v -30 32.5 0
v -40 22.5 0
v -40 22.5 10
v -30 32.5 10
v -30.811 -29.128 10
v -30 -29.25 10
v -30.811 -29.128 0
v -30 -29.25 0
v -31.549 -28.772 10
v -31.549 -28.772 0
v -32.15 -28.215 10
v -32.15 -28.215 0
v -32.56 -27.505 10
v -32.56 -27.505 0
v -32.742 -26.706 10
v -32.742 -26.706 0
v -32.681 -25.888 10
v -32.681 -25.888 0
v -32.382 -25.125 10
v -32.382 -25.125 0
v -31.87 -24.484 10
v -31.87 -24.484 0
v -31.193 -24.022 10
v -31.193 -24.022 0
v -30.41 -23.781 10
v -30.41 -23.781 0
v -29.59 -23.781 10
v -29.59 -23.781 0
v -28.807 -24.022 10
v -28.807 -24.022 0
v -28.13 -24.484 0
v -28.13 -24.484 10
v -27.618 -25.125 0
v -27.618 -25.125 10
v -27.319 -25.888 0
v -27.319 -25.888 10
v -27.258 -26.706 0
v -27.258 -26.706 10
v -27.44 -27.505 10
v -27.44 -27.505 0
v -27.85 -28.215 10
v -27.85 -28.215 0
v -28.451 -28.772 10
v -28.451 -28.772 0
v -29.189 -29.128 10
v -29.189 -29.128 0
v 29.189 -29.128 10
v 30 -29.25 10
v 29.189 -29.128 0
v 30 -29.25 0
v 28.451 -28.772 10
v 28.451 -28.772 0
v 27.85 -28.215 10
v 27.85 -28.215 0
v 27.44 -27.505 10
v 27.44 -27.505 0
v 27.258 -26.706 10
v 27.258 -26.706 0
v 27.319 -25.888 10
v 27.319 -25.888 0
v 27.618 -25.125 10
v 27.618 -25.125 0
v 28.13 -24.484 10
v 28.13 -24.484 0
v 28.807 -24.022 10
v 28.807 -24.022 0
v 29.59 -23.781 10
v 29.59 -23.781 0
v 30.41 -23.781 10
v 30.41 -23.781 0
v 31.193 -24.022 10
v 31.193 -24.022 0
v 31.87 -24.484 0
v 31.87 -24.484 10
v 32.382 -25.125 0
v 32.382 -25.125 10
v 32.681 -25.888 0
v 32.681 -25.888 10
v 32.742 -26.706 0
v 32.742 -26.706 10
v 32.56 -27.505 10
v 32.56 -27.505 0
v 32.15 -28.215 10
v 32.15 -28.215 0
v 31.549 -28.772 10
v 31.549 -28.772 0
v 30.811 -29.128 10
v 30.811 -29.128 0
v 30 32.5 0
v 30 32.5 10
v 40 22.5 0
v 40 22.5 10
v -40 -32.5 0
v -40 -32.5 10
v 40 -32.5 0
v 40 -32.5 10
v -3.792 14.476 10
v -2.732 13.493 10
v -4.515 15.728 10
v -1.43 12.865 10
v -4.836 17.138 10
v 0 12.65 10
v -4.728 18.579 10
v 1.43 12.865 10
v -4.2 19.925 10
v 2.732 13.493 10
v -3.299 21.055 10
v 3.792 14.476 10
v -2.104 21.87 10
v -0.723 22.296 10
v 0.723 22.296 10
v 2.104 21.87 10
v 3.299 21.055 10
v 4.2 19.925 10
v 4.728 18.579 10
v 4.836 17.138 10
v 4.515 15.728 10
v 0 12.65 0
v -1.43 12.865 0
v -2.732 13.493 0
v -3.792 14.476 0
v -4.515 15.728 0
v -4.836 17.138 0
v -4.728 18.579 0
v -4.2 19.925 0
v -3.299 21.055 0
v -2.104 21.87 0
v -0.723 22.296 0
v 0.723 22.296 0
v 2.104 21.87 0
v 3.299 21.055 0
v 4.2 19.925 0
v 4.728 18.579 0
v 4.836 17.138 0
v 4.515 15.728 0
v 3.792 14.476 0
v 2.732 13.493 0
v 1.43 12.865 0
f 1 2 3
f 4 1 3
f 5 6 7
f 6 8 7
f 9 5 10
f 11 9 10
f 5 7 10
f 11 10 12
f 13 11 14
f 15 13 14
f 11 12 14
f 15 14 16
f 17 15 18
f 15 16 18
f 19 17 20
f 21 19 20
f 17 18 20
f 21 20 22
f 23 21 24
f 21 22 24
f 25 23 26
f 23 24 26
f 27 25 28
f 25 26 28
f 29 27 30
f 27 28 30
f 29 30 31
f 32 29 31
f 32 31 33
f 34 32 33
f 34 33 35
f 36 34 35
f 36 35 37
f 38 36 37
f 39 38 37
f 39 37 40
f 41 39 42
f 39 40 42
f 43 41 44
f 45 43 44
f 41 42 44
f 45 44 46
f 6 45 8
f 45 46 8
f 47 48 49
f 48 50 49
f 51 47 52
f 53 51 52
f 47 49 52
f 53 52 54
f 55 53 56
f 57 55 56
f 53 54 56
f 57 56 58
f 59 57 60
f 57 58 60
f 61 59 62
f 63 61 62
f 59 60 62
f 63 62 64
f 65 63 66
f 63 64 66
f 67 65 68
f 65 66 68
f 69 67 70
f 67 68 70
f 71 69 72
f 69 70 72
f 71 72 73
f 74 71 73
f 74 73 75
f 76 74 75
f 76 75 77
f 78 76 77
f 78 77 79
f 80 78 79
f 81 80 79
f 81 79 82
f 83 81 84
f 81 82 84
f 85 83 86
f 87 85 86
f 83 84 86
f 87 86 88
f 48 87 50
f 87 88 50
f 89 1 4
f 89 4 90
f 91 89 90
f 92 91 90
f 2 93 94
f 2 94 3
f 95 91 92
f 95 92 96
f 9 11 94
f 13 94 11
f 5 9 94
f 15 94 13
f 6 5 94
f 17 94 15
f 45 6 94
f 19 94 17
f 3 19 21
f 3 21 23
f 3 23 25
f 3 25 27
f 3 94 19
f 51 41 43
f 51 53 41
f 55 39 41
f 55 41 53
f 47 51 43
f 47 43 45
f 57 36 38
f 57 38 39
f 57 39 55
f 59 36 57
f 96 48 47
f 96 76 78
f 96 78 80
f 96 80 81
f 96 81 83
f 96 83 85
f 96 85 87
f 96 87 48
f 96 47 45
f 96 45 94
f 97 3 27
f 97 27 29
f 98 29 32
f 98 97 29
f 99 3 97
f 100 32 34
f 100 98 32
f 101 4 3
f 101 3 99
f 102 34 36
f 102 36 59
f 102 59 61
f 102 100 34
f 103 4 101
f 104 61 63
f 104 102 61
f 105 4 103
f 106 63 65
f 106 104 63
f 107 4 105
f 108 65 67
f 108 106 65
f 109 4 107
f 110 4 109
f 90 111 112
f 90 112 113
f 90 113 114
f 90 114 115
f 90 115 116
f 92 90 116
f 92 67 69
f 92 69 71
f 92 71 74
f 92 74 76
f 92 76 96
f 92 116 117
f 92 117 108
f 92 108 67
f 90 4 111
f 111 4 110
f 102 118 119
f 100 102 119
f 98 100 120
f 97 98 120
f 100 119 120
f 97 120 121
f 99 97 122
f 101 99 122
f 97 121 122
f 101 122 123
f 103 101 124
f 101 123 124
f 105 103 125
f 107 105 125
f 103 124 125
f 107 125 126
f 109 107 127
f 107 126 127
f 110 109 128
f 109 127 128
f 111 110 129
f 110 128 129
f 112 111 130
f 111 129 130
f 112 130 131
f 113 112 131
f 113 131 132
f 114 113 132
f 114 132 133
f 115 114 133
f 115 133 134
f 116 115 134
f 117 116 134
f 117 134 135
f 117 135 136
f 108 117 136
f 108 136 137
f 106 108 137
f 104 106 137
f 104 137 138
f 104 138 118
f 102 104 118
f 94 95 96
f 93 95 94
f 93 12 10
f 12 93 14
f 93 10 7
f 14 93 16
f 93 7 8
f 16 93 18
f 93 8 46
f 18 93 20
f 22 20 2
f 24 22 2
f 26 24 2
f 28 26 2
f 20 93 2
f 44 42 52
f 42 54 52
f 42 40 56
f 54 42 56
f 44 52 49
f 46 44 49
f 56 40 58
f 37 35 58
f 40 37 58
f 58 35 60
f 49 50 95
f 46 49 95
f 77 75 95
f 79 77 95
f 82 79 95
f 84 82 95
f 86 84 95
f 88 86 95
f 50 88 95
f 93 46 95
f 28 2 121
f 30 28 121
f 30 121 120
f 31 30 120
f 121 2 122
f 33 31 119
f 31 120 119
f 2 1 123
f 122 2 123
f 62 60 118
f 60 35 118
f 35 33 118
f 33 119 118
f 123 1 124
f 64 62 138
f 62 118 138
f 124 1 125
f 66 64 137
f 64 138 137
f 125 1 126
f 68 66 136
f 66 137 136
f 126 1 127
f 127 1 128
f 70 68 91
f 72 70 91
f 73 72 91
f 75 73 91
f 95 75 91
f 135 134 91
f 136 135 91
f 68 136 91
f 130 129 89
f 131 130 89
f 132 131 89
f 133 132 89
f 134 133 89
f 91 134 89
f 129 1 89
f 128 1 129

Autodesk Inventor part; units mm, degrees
ref_plane "YZ Plane" through (0, 0, 0) normal (1, 0, 0) x (0, 1, 0)
ref_plane "XZ Plane" through (0, 0, 0) normal (0, 1, 0) x (-1, 0, 0)
ref_plane "XY Plane" through (0, 0, 0) normal (0, 0, 1) x (1, 0, 0)
sketch "Skizze_Grundkörper" plane through (0, 0, 0) normal (0, 0, 1) x (1, 0, 0)
  line L0 (-56, 0) -> (56, 0) projected
  line L1 (0, -45.5) -> (0, 45.5) projected
  line L2 (40, -32.5) -> (-40, -32.5)
  line L3 (-40, -32.5) -> (-40, 32.5)
  line L4 (-40, 32.5) -> (40, 32.5)
  line L5 (40, 32.5) -> (40, -32.5)
  line L6 (40, -32.5) -> (-40, 32.5) construction
  line L7 (-40, -32.5) -> (40, 32.5) construction
  point P0 (0, 0)
  dimension "Länge" = 80
  dimension "Höhe" = 65
extrude "Grundkörper" add sketch "Skizze_Grundkörper" along normal blind 10
sketch "Skizze2" plane through (0, 0, 10) normal (0, 0, 1) x (1, 0, 0)
  line L0 (-40, -32.5) -> (40, -32.5) projected
  line L1 (40, -32.5) -> (40, 32.5) projected
  line L2 (40, 32.5) -> (-40, 32.5) projected
  line L3 (-40, 32.5) -> (-40, -32.5) projected
  line L4 (-56, 0) -> (56, 0) projected
  line L5 (0, -45.5) -> (0, 45.5) projected
  point P0 (0, 0)
  point P1 (0, 17.5)
  dimension "d4" = 50
hole "Bohrung_9,7_mm" at (0, 17.5, 10) direction (0, 0, -1) diameter 9.7 end through all
sketch "Skizze3" plane through (0, 0, 10) normal (0, 0, 1) x (1, 0, 0)
  circle A0 centre (0, 17.5) radius 4.85 projected
  line L0 (-40, -32.5) -> (40, -32.5) projected
  line L1 (40, -32.5) -> (40, 32.5) projected
  line L2 (40, 32.5) -> (-40, 32.5) projected
  line L3 (-40, 32.5) -> (-40, -32.5) projected
  line L4 (-56, 0) -> (56, 0) projected
  line L5 (0, -45.5) -> (0, 45.5) projected
  point P0 (0, 0)
  point P1 (-30, -26.5)
  point P2 (30, -26.5)
  dimension "d12" = 60
  dimension "d13" = 6
hole "Bohrung_5,5_mm" at (-30, -26.5, 10) at (30, -26.5, 10) direction (0, 0, -1) diameter 5.5 end through all
chamfer "Fase_10_mm" distance 10 angle 45 2 edges at (-40, 32.5, 5) (40, 32.5, 5)
properties part number "Werkstück_B" material "Stahl, unlegiert"
